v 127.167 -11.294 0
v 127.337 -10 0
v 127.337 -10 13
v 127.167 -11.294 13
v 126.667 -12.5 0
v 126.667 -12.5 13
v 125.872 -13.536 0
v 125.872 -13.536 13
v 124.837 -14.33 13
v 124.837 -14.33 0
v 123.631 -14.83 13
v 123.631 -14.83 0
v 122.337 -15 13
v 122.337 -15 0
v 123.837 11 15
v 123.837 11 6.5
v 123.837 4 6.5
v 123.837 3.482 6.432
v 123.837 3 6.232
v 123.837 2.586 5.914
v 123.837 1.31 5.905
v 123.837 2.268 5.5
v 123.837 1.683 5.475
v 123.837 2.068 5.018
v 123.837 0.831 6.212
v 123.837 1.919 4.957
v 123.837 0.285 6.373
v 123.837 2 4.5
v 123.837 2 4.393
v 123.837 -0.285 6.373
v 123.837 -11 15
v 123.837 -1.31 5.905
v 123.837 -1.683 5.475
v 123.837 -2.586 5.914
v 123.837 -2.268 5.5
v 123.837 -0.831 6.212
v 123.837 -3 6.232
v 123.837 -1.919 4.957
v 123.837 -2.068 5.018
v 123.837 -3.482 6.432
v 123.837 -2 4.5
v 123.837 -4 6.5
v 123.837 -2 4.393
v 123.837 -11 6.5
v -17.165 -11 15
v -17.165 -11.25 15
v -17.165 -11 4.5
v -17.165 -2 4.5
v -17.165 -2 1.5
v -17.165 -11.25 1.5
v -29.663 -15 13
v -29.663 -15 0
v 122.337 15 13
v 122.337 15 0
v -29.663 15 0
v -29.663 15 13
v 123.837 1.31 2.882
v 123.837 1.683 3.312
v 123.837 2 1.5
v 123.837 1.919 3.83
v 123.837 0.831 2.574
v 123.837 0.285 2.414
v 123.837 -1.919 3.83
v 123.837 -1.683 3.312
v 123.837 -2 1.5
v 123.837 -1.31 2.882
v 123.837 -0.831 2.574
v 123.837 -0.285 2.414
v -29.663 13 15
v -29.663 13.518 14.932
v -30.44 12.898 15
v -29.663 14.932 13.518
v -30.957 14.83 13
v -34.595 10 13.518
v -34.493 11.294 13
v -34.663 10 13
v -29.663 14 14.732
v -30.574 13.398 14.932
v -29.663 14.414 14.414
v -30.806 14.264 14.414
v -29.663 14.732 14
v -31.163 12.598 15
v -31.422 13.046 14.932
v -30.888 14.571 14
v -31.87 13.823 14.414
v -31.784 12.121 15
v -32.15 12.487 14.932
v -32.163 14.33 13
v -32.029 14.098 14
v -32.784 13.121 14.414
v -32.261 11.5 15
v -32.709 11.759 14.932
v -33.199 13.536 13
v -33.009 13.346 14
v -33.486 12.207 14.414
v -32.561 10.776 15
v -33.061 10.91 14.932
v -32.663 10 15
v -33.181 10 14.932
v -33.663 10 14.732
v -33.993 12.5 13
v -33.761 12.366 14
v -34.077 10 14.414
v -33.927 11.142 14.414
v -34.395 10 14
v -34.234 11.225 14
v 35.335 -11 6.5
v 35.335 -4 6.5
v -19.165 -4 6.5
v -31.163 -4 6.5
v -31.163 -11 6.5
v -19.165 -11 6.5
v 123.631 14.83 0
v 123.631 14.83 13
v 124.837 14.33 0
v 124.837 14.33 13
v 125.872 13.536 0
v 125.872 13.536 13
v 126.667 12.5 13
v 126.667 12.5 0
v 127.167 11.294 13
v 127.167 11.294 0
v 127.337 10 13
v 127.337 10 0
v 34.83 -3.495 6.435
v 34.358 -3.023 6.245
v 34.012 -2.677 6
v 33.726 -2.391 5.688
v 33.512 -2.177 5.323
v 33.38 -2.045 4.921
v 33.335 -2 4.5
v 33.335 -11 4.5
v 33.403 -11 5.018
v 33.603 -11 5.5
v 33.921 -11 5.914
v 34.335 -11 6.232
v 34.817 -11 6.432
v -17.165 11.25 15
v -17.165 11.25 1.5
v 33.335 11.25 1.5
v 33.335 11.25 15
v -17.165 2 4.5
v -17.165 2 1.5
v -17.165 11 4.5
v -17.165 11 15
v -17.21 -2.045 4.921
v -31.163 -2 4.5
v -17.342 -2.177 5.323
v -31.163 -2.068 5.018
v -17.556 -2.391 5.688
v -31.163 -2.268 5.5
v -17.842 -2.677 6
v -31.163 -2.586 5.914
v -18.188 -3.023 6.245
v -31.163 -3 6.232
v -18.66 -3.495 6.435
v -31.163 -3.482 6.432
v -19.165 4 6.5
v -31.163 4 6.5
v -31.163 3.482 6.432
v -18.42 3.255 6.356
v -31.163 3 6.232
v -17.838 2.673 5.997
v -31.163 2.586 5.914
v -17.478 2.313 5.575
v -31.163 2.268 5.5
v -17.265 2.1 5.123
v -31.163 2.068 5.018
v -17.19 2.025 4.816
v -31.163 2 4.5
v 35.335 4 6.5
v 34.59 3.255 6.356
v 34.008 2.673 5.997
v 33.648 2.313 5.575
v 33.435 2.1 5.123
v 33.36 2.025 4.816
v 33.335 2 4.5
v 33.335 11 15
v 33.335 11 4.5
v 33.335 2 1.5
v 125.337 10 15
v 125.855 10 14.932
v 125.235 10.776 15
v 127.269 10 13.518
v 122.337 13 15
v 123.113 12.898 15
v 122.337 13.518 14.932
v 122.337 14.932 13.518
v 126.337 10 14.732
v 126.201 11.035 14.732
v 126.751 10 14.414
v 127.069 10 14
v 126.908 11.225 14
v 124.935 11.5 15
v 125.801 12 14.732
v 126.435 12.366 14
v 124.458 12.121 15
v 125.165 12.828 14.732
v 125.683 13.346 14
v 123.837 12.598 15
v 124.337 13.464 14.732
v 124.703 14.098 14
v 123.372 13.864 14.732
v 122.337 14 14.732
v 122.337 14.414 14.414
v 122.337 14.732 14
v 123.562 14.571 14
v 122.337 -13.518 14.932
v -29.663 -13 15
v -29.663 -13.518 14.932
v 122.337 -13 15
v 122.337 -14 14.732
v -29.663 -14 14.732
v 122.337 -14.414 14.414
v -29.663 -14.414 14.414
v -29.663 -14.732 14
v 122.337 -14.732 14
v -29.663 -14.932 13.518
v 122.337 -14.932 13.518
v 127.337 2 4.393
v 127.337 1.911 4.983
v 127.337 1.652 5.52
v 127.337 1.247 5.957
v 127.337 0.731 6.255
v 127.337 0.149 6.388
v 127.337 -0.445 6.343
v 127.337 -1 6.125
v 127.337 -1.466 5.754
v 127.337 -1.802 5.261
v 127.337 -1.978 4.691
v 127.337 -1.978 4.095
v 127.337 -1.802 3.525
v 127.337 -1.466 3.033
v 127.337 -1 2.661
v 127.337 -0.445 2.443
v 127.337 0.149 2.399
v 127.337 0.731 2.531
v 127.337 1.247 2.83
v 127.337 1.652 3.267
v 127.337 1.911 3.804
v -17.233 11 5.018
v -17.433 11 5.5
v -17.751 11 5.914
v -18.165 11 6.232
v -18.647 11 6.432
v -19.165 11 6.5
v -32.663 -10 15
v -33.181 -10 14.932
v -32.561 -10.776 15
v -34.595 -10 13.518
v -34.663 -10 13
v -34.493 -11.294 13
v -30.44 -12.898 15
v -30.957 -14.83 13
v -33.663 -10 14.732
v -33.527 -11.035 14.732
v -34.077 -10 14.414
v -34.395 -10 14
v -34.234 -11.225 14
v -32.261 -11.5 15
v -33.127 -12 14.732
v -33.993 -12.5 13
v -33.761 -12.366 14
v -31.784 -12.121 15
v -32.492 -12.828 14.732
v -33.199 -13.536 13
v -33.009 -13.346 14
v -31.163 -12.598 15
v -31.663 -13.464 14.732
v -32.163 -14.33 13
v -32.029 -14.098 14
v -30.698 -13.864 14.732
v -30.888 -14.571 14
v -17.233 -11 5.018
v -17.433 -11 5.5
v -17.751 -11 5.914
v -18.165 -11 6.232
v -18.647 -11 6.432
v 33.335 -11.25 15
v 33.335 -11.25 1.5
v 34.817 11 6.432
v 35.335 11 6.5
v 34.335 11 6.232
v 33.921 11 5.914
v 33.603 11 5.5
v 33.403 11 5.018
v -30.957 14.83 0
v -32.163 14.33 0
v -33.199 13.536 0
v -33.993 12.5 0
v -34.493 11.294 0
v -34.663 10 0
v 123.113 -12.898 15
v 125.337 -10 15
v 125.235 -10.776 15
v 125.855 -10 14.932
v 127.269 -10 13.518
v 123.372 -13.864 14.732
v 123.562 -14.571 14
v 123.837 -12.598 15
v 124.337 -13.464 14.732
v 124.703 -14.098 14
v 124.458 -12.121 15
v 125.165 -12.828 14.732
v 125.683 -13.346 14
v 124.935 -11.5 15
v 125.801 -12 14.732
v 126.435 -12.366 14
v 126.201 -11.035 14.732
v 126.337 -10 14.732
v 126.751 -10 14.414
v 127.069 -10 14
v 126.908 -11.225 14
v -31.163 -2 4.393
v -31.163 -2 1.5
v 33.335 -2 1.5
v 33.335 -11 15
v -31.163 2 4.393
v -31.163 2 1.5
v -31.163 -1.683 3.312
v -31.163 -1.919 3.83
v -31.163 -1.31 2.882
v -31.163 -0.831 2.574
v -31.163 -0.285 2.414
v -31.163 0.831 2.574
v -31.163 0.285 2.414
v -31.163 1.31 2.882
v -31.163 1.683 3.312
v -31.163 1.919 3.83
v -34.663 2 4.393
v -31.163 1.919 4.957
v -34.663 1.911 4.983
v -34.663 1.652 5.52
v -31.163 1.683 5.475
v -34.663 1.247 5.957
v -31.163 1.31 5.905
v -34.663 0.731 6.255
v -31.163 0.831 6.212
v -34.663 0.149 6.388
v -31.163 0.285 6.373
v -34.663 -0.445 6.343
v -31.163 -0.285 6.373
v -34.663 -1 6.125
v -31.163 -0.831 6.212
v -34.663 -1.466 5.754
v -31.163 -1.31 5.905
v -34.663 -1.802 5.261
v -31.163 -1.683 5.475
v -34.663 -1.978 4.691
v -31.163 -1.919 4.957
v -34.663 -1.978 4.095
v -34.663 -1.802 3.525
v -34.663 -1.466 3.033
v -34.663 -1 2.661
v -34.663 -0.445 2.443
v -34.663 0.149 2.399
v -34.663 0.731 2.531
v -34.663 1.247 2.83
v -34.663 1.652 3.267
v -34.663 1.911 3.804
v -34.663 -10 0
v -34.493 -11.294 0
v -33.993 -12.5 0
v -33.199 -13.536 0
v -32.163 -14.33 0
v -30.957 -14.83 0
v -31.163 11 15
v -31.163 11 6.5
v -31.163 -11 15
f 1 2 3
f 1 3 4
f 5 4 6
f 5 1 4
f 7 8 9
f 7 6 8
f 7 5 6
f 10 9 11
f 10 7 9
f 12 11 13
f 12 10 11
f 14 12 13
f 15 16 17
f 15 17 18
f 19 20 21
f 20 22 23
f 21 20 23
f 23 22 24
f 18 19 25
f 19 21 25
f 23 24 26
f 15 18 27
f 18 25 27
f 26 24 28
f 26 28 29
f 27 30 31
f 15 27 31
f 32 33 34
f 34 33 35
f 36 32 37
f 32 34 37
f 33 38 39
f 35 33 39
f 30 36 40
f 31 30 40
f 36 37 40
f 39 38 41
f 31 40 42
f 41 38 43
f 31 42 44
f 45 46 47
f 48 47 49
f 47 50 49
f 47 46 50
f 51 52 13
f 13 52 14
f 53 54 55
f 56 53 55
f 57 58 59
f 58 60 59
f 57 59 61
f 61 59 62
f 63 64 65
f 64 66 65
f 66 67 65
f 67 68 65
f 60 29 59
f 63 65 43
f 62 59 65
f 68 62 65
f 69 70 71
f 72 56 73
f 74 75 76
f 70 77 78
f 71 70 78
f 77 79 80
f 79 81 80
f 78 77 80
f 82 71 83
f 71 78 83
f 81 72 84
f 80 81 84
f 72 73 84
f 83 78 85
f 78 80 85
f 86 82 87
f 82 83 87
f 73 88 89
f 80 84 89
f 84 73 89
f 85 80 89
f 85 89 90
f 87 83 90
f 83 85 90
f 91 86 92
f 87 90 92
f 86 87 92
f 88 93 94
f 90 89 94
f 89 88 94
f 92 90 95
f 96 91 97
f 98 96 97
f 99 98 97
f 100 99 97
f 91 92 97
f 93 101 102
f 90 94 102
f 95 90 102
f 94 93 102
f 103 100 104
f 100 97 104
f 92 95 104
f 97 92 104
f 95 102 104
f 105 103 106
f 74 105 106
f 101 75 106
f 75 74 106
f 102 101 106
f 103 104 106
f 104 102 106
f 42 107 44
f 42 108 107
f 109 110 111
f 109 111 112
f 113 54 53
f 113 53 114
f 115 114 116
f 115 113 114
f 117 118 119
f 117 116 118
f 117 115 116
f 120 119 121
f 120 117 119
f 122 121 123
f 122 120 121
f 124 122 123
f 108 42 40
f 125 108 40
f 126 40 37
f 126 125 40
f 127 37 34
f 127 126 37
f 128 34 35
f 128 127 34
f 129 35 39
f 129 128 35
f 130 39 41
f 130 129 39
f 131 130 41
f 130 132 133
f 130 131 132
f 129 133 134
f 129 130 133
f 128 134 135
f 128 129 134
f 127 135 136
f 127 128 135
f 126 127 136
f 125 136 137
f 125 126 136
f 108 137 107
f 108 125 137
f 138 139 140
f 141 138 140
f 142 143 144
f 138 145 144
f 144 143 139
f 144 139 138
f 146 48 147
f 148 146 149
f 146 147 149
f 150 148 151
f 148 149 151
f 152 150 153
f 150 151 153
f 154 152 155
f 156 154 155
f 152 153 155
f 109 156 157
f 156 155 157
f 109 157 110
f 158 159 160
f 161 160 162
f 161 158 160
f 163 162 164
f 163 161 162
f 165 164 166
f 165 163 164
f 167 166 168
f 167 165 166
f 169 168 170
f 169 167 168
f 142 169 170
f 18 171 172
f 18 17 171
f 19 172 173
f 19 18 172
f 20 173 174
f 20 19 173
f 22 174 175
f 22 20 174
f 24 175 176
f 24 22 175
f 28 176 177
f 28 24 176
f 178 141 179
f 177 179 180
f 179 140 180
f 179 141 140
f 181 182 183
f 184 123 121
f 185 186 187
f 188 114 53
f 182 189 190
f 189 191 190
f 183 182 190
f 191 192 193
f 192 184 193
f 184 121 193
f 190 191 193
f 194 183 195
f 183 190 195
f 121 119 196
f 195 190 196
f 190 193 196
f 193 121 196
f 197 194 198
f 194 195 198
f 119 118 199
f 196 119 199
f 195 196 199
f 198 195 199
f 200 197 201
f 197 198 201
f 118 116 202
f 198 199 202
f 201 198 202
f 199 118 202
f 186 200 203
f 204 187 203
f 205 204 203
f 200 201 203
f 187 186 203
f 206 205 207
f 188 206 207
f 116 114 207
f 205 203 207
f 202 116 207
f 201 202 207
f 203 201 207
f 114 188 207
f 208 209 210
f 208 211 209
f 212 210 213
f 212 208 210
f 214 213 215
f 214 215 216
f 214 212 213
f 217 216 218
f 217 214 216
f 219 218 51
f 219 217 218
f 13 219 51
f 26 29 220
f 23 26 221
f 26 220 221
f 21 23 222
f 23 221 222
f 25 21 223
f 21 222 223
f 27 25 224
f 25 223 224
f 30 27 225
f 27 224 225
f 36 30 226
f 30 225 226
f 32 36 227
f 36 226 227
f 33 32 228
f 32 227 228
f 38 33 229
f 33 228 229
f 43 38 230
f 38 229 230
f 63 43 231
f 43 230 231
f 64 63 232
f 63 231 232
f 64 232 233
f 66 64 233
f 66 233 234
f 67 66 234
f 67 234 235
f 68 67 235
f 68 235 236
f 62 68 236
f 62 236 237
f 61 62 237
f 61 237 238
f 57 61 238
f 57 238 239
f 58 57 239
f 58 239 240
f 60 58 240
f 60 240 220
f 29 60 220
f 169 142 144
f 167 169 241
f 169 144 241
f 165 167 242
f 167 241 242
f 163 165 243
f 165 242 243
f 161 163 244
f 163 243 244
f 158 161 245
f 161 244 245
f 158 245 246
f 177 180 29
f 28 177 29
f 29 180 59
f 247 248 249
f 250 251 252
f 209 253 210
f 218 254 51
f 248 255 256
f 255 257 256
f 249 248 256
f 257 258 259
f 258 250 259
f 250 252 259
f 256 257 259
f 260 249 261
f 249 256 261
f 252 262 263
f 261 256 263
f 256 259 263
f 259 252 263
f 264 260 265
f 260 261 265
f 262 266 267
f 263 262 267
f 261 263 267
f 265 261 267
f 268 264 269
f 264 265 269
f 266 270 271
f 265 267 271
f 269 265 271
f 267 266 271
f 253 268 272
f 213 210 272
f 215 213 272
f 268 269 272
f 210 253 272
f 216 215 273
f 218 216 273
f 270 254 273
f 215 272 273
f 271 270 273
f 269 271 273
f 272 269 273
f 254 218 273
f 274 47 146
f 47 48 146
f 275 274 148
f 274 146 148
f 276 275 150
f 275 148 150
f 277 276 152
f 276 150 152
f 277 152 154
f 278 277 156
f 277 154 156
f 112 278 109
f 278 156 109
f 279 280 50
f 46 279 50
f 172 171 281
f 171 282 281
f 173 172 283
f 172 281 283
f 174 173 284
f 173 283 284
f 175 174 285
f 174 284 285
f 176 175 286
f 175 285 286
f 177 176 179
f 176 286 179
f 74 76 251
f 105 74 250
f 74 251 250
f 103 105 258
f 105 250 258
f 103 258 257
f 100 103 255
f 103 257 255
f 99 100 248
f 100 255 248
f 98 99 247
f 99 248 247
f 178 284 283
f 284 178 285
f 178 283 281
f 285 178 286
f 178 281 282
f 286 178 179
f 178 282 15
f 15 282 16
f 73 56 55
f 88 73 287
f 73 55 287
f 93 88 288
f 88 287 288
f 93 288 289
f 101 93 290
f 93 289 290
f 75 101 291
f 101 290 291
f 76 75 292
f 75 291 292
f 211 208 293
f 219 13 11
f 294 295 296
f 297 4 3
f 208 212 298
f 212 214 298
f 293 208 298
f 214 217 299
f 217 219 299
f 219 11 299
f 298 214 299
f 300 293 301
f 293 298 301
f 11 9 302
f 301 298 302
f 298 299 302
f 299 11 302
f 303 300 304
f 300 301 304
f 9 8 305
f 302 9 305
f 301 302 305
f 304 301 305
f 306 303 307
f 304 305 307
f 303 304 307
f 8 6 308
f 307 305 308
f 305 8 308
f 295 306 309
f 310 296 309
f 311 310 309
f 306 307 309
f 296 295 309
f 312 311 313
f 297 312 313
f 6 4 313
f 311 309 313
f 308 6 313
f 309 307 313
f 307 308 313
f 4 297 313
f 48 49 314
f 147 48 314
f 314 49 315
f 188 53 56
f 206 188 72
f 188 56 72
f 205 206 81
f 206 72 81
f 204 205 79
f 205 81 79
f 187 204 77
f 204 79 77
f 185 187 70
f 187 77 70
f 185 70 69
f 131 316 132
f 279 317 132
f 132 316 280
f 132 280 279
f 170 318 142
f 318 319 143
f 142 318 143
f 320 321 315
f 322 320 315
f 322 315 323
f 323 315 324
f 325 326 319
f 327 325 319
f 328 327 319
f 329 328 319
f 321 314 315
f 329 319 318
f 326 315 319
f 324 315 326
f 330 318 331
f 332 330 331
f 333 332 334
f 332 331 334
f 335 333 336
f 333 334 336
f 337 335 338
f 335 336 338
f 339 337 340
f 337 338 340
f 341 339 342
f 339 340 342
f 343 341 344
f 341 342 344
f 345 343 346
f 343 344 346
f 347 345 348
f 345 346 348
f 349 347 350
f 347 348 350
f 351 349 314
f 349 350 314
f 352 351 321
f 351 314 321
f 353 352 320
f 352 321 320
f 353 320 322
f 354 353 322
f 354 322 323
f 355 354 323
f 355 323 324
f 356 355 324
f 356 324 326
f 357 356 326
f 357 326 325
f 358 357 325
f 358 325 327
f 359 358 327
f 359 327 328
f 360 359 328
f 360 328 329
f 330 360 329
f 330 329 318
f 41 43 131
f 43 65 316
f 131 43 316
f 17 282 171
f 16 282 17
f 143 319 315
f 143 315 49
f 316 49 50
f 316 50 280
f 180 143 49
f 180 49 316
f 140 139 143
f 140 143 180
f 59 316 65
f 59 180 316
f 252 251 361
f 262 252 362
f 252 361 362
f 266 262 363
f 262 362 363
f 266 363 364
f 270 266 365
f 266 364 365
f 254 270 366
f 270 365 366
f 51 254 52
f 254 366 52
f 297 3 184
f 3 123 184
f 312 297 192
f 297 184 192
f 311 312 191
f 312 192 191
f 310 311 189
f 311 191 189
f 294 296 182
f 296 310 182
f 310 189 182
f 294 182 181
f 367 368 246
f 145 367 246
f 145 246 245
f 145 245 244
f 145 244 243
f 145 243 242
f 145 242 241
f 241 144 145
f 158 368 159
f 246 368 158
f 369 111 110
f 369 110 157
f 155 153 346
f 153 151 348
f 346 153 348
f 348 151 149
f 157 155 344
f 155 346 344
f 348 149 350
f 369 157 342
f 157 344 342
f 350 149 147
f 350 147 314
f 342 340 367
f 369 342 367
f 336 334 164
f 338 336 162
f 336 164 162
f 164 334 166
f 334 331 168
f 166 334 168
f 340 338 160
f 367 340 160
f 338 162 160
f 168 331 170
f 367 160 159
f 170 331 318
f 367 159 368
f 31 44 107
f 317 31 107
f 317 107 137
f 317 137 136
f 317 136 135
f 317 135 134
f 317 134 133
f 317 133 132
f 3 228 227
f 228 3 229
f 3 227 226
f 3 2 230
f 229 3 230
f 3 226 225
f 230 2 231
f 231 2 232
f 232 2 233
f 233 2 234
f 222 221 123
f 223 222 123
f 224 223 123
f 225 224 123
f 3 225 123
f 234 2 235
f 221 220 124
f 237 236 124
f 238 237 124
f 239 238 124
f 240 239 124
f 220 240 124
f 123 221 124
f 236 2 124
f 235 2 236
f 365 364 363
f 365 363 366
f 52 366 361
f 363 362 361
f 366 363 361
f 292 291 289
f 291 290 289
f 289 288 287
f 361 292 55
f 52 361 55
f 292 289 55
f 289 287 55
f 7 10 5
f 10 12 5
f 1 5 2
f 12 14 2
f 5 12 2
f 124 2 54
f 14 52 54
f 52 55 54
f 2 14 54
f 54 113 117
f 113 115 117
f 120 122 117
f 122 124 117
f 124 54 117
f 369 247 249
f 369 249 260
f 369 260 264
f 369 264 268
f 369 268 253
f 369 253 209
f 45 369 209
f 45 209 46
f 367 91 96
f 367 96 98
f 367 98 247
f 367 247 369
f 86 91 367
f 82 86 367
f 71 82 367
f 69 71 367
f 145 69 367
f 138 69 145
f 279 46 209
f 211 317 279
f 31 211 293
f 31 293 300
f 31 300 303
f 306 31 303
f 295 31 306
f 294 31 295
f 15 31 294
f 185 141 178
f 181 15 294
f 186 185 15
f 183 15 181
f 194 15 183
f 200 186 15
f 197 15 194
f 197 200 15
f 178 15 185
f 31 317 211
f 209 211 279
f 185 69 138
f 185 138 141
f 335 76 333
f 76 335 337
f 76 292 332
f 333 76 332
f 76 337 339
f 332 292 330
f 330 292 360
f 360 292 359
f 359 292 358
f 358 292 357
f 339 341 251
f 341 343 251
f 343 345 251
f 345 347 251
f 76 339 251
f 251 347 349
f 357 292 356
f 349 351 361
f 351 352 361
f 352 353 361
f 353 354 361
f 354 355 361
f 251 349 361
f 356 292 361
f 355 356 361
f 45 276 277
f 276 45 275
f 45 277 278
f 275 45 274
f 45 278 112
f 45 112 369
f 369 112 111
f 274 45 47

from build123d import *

# Parameters (mm, degrees)
F0_W         = 50.5
F0_H         = 9
F0_H_2       = 2
F0_W_2       = 12.75
F0_H_3       = 0.25
F0_W_3       = 1.2480659857
F1_DEPTH     = 1.5
F0_W_4       = 77.7519340143
F2_DEPTH     = 6.5
F3_DEPTH     = 15
F4_R         = 2
F5_DEPTH     = 162.001
F6_R         = 2
F7_T1_DEPTH  = 27.5
F7_T4_ANGLE  = 90
F7_T6_ANGLE  = 90
F7_T8_ANGLE  = 90
F7_T10_ANGLE = 90


# Not quite as in the source:
# - a fillet or chamfer that OpenCascade refuses, or shapes differently, is made with other operations: its cross-section is extruded or revolved along the edge and cut away or added


with BuildPart() as f1:
    # F0 (on Top) → F1 (new body)
    with BuildSketch(Plane.XY):
        with Locations((8.0849453807, 6.5)):
            Rectangle(F0_W, F0_H)
        with Locations((8.0849453807, 1)):
            Rectangle(F0_W, F0_H_2)
        with Locations((8.0849453807, -1)):
            Rectangle(F0_W, F0_H_2)
        with Locations((-23.5400546193, -1)):
            Rectangle(F0_W_2, F0_H_2)
        with Locations((-23.5400546193, 1)):
            Rectangle(F0_W_2, F0_H_2)
        with Locations((39.7099453807, 1)):
            Rectangle(F0_W_2, F0_H_2)
        with Locations((39.7099453807, -1)):
            Rectangle(F0_W_2, F0_H_2)
        Polygon((46.0849453807, 2), (46.0849453807, 0), (46.0849453807, -2), (123.8368793949, -2), (123.8368793949, 2), align=None)
        with Locations((8.0849453807, -6.5)):
            Rectangle(F0_W, F0_H)
        with Locations((8.0849453807, 11.125)):
            Rectangle(F0_W, F0_H_3)
        with Locations((8.0849453807, -11.125)):
            Rectangle(F0_W, F0_H_3)
        with Locations((-30.5390876122, -1)):
            Rectangle(F0_W_3, F0_H_2)
        with Locations((-30.5390876122, 1)):
            Rectangle(F0_W_3, F0_H_2)
    extrude(amount=F1_DEPTH)

    # F0 (on Top) → F2 (join)
    with BuildSketch(Plane.XY):
        with Locations((-23.5400546193, 6.5)):
            Rectangle(F0_W_2, F0_H)
        with Locations((-30.5390876122, 6.5)):
            Rectangle(F0_W_3, F0_H)
        with Locations((-23.5400546193, -6.5)):
            Rectangle(F0_W_2, F0_H)
        with Locations((-30.5390876122, -6.5)):
            Rectangle(F0_W_3, F0_H)
        with Locations((39.7099453807, -6.5)):
            Rectangle(F0_W_2, F0_H)
        with Locations((39.7099453807, 6.5)):
            Rectangle(F0_W_2, F0_H)
        with Locations((84.9609123878, 6.5)):
            Rectangle(F0_W_4, F0_H)
        with Locations((84.9609123878, -6.5)):
            Rectangle(F0_W_4, F0_H)
    extrude(amount=F2_DEPTH)

    # F0 (on Top) → F3 (join)
    with BuildSketch(Plane.XY):
        Polygon((127.3368793949, -15), (127.3368793949, 15), (-34.6631206051, 15), (-34.6631206051, 0), (-34.6631206051, -15), align=None)
        Polygon((-31.1631206051, -2), (-31.1631206051, 0), (-31.1631206051, 2), (-31.1631206051, 11), (-29.9150546193, 11), (-17.1650546193, 11), (-17.1650546193, 11.25), (33.3349453807, 11.25), (33.3349453807, 11), (46.0849453807, 11), (123.8368793949, 11), (123.8368793949, 2), (123.8368793949, -2), (123.8368793949, -11), (46.0849453807, -11), (33.3349453807, -11), (33.3349453807, -11.25), (-17.1650546193, -11.25), (-17.1650546193, -11), (-29.9150546193, -11), (-31.1631206051, -11), align=None, mode=Mode.SUBTRACT)
    extrude(amount=F3_DEPTH)

    # F4 (on face) → F5 (cut, through all)
    with BuildSketch(Plane.YZ.offset(127.3368793949)):
        with Locations((0, 4.3932246044)):
            Circle(F4_R)
    extrude(amount=-F5_DEPTH, mode=Mode.SUBTRACT)

    # F6
    f6_edges = [f1.edges().sort_by_distance(p)[0] for p in [
        (-24.164088, -2, 6.5),
        (-24.164088, 2, 6.5),
        (-17.165055, -6.5, 6.5),
        (-17.165055, 6.5, 6.5),
        (33.334945, 6.5, 6.5),
        (33.334945, -6.5, 6.5),
        (78.585912, -2, 6.5),
        (78.585912, 2, 6.5),
        (46.336879, 15, 15),
        (-34.663121, 0, 15),
        (46.336879, -15, 15),
        (127.336879, 0, 15),
    ]]
    fillet(f6_edges, radius=F6_R)

    # F7: fillet of radius 5 on 4 edges, made by hand

    # F7_s2 → F7_t1 (cut)
    with BuildSketch(Plane.XY.offset(-12.5)):
        with BuildLine():
            ThreePointArc((-29.6631206051, 15), (-33.198654511, 13.5355339059), (-34.6631206051, 10))
            Line((-34.6631206051, 10), (-34.6631206051, 15))
            Line((-34.6631206051, 15), (-29.6631206051, 15))
        make_face()
        with BuildLine():
            ThreePointArc((-34.6631206051, -10), (-33.198654511, -13.5355339059), (-29.6631206051, -15))
            Line((-29.6631206051, -15), (-34.6631206051, -15))
            Line((-34.6631206051, -15), (-34.6631206051, -10))
        make_face()
        with BuildLine():
            ThreePointArc((122.3368793949, 15), (125.8724133009, 13.5355339059), (127.3368793949, 10))
            Line((127.3368793949, 10), (127.3368793949, 15))
            Line((127.3368793949, 15), (122.3368793949, 15))
        make_face()
        with BuildLine():
            ThreePointArc((127.3368793949, -10), (125.8724133009, -13.5355339059), (122.3368793949, -15))
            Line((122.3368793949, -15), (127.3368793949, -15))
            Line((127.3368793949, -15), (127.3368793949, -10))
        make_face()
    extrude(amount=F7_T1_DEPTH, mode=Mode.SUBTRACT)

    # F7_s3 → F7_t4 (revolve, cut)
    with BuildSketch(Plane.YZ.offset(122.3368793949)):
        with BuildLine():
            ThreePointArc((-13, 15), (-14.4142135624, 14.4142135624), (-15, 13))
            Line((-15, 13), (-15, 15))
            Line((-15, 15), (-13, 15))
        make_face()
    revolve(axis=Axis((122.3368793949, -10, 15), (0, 0, 1)), revolution_arc=F7_T4_ANGLE, mode=Mode.SUBTRACT)

    # F7_s5 → F7_t6 (revolve, cut)
    with BuildSketch(Plane.XZ.offset(-10)):
        with BuildLine():
            ThreePointArc((125.3368793949, 15), (126.7510929573, 14.4142135624), (127.3368793949, 13))
            Line((127.3368793949, 13), (127.3368793949, 15))
            Line((127.3368793949, 15), (125.3368793949, 15))
        make_face()
    revolve(axis=Axis((122.3368793949, 10, 15), (0, 0, 1)), revolution_arc=F7_T6_ANGLE, mode=Mode.SUBTRACT)

    # F7_s7 → F7_t8 (revolve, cut)
    with BuildSketch(Plane.XZ.offset(10)):
        with BuildLine():
            ThreePointArc((-32.6631206051, 15), (-34.0773341674, 14.4142135624), (-34.6631206051, 13))
            Line((-34.6631206051, 13), (-34.6631206051, 15))
            Line((-34.6631206051, 15), (-32.6631206051, 15))
        make_face()
    revolve(axis=Axis((-29.6631206051, -10, 15), (0, 0, 1)), revolution_arc=F7_T8_ANGLE, mode=Mode.SUBTRACT)

    # F7_s9 → F7_t10 (revolve, cut)
    with BuildSketch(Plane.YZ.offset(-29.6631206051)):
        with BuildLine():
            ThreePointArc((13, 15), (14.4142135624, 14.4142135624), (15, 13))
            Line((15, 13), (15, 15))
            Line((15, 15), (13, 15))
        make_face()
    revolve(axis=Axis((-29.6631206051, 10, 15), (0, 0, 1)), revolution_arc=F7_T10_ANGLE, mode=Mode.SUBTRACT)


solid = f1.part
